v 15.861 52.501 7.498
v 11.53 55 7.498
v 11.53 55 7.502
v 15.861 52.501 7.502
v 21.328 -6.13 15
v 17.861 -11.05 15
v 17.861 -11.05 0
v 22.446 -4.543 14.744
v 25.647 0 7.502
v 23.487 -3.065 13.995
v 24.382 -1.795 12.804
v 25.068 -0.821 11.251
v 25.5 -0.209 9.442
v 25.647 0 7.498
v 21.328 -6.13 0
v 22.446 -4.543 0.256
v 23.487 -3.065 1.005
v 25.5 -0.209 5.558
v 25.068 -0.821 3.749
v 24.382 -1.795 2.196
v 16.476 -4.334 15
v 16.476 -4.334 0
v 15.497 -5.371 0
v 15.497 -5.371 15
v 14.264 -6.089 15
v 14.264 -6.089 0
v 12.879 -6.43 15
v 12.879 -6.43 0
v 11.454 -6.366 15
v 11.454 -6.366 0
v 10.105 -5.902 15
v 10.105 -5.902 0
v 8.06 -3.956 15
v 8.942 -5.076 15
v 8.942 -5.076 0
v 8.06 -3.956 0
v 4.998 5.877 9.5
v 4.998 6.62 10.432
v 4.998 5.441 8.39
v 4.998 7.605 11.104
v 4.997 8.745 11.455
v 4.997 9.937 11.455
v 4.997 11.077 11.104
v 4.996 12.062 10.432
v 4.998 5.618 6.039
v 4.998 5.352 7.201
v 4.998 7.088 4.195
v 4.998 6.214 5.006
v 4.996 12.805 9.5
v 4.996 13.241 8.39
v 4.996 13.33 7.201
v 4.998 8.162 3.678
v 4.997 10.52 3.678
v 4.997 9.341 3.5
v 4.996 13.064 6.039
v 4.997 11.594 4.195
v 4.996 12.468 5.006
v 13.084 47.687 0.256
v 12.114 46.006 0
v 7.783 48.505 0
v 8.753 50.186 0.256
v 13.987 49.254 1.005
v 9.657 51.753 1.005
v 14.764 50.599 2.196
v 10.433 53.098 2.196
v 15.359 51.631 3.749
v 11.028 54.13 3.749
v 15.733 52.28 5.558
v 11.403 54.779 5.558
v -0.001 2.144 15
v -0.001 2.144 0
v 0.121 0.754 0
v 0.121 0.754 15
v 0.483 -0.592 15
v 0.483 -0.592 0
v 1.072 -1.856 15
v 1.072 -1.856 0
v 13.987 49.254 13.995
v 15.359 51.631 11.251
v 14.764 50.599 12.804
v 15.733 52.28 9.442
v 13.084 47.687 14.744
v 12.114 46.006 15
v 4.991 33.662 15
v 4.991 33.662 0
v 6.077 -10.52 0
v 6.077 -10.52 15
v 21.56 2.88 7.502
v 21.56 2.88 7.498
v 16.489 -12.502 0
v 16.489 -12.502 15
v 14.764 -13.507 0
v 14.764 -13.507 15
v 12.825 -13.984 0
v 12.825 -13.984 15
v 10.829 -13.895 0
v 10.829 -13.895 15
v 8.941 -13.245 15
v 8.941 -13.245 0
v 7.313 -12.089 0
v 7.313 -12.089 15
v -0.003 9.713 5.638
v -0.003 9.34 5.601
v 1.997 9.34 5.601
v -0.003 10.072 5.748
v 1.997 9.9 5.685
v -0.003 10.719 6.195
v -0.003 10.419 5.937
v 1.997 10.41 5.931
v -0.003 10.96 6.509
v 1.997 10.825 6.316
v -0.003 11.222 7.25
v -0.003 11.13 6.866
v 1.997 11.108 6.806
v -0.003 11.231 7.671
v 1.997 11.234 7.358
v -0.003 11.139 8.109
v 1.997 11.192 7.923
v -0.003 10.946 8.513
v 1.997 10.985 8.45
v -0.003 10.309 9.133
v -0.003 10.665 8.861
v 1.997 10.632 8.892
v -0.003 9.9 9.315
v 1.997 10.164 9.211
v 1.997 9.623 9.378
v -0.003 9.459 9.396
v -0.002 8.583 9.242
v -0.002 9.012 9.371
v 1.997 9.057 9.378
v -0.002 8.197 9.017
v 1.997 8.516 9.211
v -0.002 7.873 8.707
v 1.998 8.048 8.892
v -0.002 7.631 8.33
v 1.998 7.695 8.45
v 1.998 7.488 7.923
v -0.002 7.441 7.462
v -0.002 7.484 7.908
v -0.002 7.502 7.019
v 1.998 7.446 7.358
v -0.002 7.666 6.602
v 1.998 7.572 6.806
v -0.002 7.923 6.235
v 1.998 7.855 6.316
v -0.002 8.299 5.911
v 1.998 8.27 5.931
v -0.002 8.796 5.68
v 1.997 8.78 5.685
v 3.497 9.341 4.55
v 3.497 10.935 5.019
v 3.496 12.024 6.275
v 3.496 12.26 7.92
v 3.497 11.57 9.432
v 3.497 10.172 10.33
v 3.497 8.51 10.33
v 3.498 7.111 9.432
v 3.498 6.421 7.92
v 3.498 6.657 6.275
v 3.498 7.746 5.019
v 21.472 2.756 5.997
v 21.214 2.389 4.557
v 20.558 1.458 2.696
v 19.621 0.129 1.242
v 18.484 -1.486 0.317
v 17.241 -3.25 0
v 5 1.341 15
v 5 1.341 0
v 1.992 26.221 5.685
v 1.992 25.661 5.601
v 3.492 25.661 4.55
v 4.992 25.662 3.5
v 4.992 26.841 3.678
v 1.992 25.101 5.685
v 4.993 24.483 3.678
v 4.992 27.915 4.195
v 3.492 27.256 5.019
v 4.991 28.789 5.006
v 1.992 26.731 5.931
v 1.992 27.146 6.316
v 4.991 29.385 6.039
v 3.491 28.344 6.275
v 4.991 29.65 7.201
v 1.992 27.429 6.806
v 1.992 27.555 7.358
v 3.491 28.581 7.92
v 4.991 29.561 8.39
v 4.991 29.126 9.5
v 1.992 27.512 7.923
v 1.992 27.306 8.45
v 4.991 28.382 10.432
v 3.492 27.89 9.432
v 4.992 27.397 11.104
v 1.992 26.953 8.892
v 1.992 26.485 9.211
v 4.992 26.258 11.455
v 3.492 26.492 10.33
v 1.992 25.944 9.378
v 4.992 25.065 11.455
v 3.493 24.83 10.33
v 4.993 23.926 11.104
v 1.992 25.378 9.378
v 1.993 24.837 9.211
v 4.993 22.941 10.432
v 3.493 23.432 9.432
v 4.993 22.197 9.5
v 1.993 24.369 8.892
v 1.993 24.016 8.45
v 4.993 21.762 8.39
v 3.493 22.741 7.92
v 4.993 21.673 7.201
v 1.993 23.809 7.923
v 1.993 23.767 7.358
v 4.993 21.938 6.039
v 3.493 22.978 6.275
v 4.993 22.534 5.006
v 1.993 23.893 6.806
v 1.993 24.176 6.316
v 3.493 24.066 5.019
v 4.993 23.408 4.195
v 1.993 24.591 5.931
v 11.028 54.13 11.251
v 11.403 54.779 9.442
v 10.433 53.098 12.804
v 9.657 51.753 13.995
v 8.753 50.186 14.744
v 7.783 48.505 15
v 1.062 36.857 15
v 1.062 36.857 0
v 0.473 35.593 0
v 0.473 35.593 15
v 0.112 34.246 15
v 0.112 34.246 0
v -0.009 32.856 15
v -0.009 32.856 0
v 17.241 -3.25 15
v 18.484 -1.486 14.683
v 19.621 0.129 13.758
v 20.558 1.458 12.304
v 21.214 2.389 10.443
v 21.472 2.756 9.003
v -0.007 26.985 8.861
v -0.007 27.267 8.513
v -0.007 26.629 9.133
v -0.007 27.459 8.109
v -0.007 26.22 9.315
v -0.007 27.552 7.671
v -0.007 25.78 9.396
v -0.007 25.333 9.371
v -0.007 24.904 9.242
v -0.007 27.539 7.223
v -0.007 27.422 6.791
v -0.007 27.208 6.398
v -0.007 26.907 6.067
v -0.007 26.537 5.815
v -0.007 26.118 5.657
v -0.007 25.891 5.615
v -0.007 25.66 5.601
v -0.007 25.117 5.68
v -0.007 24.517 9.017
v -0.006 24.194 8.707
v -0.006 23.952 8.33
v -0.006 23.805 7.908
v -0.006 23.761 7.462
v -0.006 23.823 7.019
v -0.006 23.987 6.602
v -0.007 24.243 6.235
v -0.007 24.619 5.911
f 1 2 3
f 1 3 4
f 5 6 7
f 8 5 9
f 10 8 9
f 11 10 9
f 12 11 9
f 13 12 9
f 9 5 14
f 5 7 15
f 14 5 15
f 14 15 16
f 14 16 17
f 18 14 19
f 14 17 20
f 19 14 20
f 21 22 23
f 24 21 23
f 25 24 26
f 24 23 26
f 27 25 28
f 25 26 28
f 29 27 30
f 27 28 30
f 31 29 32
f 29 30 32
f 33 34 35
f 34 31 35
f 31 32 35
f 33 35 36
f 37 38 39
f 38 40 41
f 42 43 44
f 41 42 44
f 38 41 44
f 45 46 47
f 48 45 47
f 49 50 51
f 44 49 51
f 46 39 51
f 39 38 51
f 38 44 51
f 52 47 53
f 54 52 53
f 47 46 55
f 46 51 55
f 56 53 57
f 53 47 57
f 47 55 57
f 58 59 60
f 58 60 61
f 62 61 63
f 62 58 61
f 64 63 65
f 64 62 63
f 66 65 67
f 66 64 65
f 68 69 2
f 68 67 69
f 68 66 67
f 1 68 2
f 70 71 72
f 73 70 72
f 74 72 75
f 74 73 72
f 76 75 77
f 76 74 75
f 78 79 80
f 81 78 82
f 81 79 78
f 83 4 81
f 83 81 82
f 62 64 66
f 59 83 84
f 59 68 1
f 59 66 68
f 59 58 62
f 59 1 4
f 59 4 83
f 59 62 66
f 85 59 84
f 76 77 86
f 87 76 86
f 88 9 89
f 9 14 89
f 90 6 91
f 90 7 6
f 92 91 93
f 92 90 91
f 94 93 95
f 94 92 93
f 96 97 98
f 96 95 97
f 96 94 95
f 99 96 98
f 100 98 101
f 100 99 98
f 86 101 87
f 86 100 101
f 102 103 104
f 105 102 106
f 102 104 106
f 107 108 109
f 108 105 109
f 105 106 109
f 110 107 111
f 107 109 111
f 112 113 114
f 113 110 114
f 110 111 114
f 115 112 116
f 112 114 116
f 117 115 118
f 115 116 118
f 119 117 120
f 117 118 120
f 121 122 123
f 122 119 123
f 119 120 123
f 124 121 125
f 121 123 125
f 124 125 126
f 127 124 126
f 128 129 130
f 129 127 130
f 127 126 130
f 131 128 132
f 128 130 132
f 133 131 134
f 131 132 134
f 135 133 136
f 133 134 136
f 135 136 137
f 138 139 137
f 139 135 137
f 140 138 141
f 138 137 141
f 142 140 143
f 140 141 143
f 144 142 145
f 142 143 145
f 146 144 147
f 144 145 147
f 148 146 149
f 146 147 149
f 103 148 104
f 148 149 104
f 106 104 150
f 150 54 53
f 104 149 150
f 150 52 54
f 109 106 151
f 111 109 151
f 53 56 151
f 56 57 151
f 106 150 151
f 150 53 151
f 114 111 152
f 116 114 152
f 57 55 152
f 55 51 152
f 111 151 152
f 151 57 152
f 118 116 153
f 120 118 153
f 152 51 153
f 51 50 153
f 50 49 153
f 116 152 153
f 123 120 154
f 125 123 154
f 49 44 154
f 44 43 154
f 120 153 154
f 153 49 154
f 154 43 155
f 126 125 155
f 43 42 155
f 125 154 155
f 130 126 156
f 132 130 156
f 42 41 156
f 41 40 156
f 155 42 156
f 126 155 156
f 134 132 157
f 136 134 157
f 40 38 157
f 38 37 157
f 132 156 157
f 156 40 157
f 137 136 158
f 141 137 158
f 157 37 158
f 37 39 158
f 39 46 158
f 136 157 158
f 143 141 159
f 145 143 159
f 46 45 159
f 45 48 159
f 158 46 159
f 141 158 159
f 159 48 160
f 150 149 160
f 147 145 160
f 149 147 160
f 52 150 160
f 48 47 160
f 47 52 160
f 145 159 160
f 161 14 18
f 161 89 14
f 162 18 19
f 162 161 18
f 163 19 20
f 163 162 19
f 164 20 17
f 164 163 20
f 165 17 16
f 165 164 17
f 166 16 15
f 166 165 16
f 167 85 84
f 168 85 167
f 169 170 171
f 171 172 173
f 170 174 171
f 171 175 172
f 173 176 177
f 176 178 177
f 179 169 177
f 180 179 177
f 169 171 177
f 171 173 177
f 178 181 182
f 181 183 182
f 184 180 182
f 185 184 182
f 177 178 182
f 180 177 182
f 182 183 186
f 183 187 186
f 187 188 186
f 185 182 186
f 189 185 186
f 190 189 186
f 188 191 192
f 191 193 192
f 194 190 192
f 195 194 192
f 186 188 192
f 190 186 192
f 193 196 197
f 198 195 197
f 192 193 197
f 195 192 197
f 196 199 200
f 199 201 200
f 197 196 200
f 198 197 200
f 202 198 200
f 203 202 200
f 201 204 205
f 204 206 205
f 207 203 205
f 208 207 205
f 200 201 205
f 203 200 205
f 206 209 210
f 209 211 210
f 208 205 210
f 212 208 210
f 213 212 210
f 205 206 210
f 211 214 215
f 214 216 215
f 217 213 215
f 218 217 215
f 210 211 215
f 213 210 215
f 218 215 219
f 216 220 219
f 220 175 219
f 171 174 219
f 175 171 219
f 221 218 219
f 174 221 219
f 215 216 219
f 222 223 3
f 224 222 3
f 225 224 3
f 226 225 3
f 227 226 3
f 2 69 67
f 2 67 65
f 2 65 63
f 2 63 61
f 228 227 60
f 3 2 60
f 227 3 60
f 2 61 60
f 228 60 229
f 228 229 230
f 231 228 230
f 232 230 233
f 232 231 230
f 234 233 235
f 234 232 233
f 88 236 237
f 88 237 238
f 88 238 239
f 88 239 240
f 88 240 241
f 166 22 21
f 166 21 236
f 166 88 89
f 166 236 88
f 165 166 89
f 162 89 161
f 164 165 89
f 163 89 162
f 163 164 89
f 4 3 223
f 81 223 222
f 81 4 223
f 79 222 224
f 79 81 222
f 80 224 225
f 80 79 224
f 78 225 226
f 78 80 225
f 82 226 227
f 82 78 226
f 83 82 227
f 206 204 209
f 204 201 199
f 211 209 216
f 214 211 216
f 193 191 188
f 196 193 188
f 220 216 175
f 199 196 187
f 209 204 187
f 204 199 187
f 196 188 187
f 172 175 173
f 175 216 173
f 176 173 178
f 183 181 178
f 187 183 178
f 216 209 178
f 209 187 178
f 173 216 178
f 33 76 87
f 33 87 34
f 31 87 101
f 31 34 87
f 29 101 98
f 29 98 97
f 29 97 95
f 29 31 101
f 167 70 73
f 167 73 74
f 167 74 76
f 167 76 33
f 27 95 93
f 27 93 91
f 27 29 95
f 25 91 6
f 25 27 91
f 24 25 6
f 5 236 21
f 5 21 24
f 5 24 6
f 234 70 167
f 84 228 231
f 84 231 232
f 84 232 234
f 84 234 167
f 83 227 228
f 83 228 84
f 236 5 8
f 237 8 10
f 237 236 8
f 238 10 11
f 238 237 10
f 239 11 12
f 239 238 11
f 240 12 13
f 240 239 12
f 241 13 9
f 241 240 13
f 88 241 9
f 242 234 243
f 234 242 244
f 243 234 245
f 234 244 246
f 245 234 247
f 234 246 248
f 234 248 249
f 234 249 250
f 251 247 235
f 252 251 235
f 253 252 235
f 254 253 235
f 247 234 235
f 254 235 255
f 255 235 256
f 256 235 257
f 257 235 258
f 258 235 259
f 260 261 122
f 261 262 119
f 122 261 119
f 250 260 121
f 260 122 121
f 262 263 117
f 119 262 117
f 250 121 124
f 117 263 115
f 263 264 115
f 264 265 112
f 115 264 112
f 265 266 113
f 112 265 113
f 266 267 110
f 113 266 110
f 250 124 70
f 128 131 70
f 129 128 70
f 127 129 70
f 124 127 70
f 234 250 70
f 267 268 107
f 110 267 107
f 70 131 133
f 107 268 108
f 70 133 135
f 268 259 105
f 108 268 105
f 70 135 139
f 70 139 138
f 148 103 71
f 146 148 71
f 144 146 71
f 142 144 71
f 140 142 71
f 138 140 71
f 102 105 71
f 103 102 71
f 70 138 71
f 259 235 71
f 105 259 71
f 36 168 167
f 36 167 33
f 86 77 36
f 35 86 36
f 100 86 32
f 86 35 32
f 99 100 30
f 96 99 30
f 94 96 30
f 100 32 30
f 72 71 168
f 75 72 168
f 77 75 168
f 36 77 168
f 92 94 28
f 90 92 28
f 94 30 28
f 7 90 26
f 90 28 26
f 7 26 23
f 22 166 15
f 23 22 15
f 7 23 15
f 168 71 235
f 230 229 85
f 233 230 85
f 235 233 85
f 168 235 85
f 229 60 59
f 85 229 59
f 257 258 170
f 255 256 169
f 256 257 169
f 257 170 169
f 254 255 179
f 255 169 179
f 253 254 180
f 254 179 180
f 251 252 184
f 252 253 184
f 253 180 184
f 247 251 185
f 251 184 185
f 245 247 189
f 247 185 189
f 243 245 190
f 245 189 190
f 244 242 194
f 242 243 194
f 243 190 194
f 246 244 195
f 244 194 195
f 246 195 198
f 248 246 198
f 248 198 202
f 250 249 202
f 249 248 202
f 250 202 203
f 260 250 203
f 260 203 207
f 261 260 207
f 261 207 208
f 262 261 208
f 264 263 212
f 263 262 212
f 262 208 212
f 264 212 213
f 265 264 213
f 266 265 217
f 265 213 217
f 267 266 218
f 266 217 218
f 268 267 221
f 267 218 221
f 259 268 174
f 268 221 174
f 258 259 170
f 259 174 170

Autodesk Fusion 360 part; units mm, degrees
sketch "Sketch1" plane through (0, 0, 0) normal (0, 0, 1) x (1, 0, 0)
  line L0 (11.5304, 55) -> (-0.0094, 35)
  line L1 (-0.0094, 35) -> (0, 0)
  line L2 (0, 0) -> (6.0773, -10.5197)
  line L3 (17.8607, -11.0501) -> (25.6471, 0)
  line L4 (15.8612, 52.5012) -> (4.9909, 33.6616)
  line L5 (4.9909, 33.6616) -> (4.9996, 1.3411)
  line L6 (4.9996, 1.3411) -> (8.0596, -3.9556)
  line L7 (16.4762, -4.3344) -> (21.5599, 2.88)
  line L8 (11.5304, 55) -> (15.8612, 52.5012)
  line L9 (25.6471, 0) -> (21.5599, 2.88)
  arc A0 (8.0596, -3.9556) -> (16.4762, -4.3344) centre (12.389, -1.4544) ccw
  arc A1 (6.0773, -10.5197) -> (17.8607, -11.0501) centre (12.1386, -7.0181) ccw
  point P0 (11.5542, -20)
  dimension "d16" = 35
  dimension "d17" = 150
  dimension "d18" = 150
  dimension "d19" = 20
  dimension "d20" = 20
  dimension "d21" = 20
  dimension "d23" = 5
  dimension "d24" = 7
extrude "Extrude1" add sketch "Sketch1" along normal blind 15
sketch "Sketch2" plane through (5, 0.0013, 0) normal (1, 0.0003, 0) x (0, 0, -1)
  line L0 (0, 1.3397) -> (0, 33.6603)
  line L1 (0, 33.6603) -> (-15, 33.6603)
  line L2 (-15, 33.6603) -> (-15, 1.3397)
  line L3 (-15, 1.3397) -> (0, 1.3397)
  line L4 (-7.5, 33.6603) -> (-7.5, 1.3397) construction
  line L5 (0, 17.5) -> (-15, 17.5) construction
  circle A0 centre (-7.5, 25.6603) radius 4
  circle A1 centre (-7.5, 9.3397) radius 4
  dimension "d27" = 8
  dimension "d28" = 8
extrude "Extrude2" cut sketch "Sketch2" against normal blind 3 draft -35 contours A0 | A1
extrude "Extrude3" cut 2 faces at (1.9929, 26.1558, 7.387) (1.9973, 9.8353, 7.0106) along direction (-1, -0.00027, 0) through all
fillet "Fillet1" radius 7.5 4 edges at (13.6958, 53.7506, 15) (13.6958, 53.7506, 0) (23.6035, 1.44, 15) (23.6035, 1.44, 0)
fillet "Fillet2" radius 8 2 edges at (-0.0094, 35, 7.5) (0, 0, 7.5)
